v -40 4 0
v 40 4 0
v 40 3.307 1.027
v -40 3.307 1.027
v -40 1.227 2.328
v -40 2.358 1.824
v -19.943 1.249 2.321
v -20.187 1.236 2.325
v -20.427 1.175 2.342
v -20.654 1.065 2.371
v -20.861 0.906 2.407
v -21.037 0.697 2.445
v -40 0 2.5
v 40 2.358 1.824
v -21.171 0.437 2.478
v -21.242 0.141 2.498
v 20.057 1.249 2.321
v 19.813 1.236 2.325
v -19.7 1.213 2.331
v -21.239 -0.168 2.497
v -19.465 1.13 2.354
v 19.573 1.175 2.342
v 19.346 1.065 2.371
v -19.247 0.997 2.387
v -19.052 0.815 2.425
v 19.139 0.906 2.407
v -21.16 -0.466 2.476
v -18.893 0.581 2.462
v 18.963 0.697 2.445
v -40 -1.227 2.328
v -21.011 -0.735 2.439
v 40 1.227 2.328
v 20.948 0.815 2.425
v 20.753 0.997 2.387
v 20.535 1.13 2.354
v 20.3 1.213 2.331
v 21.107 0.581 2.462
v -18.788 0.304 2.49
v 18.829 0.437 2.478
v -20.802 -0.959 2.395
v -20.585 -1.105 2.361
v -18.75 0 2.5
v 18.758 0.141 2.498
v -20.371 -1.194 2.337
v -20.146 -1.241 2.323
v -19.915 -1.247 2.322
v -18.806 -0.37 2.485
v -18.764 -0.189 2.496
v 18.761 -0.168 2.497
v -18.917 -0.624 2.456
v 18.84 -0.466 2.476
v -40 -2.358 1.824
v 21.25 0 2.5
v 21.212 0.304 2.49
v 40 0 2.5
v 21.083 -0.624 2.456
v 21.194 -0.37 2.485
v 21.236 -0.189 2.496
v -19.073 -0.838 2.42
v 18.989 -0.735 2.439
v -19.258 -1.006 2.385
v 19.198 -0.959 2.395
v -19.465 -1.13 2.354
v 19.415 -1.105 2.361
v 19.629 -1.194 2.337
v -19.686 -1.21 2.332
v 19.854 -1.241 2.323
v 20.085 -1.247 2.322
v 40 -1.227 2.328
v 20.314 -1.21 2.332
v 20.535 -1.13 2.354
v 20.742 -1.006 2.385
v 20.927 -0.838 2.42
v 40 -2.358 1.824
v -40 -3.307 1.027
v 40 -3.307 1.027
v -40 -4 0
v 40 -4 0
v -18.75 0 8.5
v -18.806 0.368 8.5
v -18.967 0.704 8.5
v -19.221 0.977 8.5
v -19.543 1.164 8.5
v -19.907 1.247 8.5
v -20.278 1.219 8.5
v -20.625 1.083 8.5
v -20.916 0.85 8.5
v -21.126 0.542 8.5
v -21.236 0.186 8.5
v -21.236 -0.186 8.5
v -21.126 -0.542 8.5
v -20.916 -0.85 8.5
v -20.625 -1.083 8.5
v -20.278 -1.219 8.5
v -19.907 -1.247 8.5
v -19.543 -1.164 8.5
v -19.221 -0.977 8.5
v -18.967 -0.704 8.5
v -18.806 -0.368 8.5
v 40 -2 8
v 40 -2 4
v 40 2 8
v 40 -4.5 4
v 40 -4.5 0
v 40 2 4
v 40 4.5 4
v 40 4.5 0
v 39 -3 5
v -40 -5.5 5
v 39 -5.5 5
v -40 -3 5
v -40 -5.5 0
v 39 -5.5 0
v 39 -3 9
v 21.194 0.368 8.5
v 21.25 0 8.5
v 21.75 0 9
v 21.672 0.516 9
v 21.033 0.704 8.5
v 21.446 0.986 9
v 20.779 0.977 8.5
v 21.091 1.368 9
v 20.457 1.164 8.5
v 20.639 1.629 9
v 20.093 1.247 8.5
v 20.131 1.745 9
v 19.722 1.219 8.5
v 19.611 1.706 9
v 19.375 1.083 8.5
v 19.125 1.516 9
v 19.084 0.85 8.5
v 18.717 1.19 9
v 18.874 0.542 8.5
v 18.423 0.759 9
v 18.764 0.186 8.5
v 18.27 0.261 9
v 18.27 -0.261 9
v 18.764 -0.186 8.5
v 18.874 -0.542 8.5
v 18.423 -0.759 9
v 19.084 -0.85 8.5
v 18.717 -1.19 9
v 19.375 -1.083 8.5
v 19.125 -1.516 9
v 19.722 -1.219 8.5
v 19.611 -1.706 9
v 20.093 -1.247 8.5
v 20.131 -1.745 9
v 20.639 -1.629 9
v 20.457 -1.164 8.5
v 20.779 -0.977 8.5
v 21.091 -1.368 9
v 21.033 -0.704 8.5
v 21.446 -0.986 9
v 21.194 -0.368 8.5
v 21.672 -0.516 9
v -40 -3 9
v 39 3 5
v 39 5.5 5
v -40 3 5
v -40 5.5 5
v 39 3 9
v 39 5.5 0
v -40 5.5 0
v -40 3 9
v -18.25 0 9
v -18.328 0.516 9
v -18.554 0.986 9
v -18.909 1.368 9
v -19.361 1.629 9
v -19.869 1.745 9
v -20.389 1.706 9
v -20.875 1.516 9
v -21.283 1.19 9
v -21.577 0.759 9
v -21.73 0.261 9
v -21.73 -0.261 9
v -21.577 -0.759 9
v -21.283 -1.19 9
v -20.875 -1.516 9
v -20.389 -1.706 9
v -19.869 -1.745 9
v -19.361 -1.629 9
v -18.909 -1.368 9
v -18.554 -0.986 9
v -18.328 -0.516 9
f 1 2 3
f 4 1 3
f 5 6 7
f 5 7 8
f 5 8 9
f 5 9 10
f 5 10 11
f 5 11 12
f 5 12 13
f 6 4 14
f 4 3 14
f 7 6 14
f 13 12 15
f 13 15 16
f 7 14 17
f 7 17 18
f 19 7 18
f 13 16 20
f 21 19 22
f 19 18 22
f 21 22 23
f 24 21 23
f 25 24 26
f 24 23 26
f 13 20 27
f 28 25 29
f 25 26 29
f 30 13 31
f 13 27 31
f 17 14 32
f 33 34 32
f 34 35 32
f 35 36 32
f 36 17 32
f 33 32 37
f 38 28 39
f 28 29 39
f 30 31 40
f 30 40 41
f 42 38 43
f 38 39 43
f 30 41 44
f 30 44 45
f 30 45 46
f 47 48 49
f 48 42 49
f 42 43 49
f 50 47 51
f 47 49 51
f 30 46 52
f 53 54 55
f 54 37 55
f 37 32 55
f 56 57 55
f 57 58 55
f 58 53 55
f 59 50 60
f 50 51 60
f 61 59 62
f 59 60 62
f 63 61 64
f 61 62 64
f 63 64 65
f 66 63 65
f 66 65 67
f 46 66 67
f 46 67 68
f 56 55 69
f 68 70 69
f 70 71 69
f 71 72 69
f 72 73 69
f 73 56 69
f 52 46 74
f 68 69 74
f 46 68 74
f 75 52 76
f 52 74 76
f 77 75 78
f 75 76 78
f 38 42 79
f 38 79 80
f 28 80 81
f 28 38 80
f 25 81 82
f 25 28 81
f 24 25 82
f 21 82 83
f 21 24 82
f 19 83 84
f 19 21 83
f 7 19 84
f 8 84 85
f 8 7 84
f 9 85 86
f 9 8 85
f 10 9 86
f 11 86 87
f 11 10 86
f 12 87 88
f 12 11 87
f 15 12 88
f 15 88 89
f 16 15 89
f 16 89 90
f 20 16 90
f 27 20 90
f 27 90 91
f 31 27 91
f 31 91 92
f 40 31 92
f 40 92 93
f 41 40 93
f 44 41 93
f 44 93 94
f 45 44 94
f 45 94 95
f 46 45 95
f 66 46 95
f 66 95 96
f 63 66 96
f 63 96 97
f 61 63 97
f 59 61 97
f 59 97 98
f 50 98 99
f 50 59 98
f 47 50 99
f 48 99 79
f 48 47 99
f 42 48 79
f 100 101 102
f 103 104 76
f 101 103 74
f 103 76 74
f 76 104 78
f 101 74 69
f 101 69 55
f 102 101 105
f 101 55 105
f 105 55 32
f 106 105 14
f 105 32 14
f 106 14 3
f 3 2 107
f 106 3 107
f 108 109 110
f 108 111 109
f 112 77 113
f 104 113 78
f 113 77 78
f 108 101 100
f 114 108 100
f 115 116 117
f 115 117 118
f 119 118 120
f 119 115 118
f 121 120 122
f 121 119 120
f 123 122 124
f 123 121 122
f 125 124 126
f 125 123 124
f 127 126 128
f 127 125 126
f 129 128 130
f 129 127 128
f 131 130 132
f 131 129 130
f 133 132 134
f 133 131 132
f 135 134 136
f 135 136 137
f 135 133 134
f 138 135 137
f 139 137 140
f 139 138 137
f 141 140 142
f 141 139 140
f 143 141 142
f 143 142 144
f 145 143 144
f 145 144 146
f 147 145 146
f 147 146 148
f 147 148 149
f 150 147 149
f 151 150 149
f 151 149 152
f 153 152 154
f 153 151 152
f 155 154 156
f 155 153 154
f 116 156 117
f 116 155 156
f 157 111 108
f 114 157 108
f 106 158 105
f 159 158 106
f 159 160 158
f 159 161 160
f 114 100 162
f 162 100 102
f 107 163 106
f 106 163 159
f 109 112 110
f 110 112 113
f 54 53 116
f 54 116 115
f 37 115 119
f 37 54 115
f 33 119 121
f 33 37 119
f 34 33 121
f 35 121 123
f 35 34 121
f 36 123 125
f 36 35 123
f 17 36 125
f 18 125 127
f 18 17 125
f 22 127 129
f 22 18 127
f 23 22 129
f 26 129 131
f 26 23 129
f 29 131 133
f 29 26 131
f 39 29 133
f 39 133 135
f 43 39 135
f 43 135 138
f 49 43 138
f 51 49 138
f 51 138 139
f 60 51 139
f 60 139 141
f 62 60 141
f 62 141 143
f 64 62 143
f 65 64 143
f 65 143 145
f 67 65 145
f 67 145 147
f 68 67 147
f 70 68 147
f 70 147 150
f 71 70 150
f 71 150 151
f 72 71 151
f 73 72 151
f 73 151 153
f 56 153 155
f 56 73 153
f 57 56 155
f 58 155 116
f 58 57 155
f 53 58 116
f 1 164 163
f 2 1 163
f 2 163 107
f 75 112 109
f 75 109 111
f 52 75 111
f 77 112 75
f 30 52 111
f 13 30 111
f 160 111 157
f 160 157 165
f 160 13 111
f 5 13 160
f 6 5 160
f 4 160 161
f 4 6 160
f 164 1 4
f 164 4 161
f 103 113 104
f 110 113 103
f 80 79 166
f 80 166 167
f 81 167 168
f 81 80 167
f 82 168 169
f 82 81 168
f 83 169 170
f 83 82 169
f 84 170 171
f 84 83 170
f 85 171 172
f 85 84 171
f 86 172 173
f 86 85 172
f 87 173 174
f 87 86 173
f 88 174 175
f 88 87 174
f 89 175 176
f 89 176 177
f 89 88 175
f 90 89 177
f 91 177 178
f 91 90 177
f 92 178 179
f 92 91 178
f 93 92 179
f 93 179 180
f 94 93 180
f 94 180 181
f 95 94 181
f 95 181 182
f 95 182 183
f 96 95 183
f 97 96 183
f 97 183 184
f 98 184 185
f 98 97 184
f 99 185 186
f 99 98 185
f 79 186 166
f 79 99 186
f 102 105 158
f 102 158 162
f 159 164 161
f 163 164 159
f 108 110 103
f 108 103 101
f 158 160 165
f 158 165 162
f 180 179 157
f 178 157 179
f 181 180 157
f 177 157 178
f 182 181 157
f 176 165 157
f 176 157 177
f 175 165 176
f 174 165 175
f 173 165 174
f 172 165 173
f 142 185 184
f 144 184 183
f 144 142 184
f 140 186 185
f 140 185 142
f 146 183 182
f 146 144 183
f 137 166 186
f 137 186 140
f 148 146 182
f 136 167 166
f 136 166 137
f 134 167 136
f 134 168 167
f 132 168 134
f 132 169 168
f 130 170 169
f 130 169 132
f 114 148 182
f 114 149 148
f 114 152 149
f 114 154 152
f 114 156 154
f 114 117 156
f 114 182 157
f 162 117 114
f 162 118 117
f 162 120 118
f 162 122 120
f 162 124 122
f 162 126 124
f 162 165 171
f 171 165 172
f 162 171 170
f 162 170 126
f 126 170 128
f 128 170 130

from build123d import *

# Parameters (mm, degrees)
F0_W     = 80
F0_H     = 6
F0_R     = 1.25
F1_DEPTH = 9
F0_H_2   = 2.5
F2_DEPTH = 5
F4_DEPTH = 80
F5_SIZE  = 0.5
F6_SIZE  = 1


with BuildPart() as f1:
    # F0 (on Top) → F1 (new body)
    with BuildSketch(Plane.XY):
        Rectangle(F0_W, F0_H)
        with Locations((-20, 0)):
            Circle(F0_R, mode=Mode.SUBTRACT)
        with Locations((20, 0)):
            Circle(F0_R, mode=Mode.SUBTRACT)
    extrude(amount=F1_DEPTH)

    # F0 (on Top) → F2 (join)
    with BuildSketch(Plane.XY):
        with Locations((0, -4.25)):
            Rectangle(F0_W, F0_H_2)
        with Locations((0, 4.25)):
            Rectangle(F0_W, F0_H_2)
    extrude(amount=F2_DEPTH)

    # F3 (on face) → F4 (cut)
    with BuildSketch(Plane.YZ.offset(40)):
        with BuildLine():
            Line((-4, 0), (4, 0))
            ThreePointArc((4, 0), (0, 2.5), (-4, 0))
        make_face()
    extrude(amount=-F4_DEPTH, mode=Mode.SUBTRACT)

    # F5
    f5_edges = [f1.edges().sort_by_distance(p)[0] for p in [
        (-21.25, 0, 9),
        (18.75, 0, 9),
    ]]
    chamfer(f5_edges, length=F5_SIZE)

    # F6
    f6_edges = [f1.edges().sort_by_distance(p)[0] for p in [
        (40, 4.25, 5),
        (40, 5.5, 2.5),
        (40, 3, 7),
        (40, 0, 9),
        (40, -3, 7),
        (40, -4.25, 5),
        (40, -5.5, 2.5),
    ]]
    chamfer(f6_edges, length=F6_SIZE)


solid = f1.part
